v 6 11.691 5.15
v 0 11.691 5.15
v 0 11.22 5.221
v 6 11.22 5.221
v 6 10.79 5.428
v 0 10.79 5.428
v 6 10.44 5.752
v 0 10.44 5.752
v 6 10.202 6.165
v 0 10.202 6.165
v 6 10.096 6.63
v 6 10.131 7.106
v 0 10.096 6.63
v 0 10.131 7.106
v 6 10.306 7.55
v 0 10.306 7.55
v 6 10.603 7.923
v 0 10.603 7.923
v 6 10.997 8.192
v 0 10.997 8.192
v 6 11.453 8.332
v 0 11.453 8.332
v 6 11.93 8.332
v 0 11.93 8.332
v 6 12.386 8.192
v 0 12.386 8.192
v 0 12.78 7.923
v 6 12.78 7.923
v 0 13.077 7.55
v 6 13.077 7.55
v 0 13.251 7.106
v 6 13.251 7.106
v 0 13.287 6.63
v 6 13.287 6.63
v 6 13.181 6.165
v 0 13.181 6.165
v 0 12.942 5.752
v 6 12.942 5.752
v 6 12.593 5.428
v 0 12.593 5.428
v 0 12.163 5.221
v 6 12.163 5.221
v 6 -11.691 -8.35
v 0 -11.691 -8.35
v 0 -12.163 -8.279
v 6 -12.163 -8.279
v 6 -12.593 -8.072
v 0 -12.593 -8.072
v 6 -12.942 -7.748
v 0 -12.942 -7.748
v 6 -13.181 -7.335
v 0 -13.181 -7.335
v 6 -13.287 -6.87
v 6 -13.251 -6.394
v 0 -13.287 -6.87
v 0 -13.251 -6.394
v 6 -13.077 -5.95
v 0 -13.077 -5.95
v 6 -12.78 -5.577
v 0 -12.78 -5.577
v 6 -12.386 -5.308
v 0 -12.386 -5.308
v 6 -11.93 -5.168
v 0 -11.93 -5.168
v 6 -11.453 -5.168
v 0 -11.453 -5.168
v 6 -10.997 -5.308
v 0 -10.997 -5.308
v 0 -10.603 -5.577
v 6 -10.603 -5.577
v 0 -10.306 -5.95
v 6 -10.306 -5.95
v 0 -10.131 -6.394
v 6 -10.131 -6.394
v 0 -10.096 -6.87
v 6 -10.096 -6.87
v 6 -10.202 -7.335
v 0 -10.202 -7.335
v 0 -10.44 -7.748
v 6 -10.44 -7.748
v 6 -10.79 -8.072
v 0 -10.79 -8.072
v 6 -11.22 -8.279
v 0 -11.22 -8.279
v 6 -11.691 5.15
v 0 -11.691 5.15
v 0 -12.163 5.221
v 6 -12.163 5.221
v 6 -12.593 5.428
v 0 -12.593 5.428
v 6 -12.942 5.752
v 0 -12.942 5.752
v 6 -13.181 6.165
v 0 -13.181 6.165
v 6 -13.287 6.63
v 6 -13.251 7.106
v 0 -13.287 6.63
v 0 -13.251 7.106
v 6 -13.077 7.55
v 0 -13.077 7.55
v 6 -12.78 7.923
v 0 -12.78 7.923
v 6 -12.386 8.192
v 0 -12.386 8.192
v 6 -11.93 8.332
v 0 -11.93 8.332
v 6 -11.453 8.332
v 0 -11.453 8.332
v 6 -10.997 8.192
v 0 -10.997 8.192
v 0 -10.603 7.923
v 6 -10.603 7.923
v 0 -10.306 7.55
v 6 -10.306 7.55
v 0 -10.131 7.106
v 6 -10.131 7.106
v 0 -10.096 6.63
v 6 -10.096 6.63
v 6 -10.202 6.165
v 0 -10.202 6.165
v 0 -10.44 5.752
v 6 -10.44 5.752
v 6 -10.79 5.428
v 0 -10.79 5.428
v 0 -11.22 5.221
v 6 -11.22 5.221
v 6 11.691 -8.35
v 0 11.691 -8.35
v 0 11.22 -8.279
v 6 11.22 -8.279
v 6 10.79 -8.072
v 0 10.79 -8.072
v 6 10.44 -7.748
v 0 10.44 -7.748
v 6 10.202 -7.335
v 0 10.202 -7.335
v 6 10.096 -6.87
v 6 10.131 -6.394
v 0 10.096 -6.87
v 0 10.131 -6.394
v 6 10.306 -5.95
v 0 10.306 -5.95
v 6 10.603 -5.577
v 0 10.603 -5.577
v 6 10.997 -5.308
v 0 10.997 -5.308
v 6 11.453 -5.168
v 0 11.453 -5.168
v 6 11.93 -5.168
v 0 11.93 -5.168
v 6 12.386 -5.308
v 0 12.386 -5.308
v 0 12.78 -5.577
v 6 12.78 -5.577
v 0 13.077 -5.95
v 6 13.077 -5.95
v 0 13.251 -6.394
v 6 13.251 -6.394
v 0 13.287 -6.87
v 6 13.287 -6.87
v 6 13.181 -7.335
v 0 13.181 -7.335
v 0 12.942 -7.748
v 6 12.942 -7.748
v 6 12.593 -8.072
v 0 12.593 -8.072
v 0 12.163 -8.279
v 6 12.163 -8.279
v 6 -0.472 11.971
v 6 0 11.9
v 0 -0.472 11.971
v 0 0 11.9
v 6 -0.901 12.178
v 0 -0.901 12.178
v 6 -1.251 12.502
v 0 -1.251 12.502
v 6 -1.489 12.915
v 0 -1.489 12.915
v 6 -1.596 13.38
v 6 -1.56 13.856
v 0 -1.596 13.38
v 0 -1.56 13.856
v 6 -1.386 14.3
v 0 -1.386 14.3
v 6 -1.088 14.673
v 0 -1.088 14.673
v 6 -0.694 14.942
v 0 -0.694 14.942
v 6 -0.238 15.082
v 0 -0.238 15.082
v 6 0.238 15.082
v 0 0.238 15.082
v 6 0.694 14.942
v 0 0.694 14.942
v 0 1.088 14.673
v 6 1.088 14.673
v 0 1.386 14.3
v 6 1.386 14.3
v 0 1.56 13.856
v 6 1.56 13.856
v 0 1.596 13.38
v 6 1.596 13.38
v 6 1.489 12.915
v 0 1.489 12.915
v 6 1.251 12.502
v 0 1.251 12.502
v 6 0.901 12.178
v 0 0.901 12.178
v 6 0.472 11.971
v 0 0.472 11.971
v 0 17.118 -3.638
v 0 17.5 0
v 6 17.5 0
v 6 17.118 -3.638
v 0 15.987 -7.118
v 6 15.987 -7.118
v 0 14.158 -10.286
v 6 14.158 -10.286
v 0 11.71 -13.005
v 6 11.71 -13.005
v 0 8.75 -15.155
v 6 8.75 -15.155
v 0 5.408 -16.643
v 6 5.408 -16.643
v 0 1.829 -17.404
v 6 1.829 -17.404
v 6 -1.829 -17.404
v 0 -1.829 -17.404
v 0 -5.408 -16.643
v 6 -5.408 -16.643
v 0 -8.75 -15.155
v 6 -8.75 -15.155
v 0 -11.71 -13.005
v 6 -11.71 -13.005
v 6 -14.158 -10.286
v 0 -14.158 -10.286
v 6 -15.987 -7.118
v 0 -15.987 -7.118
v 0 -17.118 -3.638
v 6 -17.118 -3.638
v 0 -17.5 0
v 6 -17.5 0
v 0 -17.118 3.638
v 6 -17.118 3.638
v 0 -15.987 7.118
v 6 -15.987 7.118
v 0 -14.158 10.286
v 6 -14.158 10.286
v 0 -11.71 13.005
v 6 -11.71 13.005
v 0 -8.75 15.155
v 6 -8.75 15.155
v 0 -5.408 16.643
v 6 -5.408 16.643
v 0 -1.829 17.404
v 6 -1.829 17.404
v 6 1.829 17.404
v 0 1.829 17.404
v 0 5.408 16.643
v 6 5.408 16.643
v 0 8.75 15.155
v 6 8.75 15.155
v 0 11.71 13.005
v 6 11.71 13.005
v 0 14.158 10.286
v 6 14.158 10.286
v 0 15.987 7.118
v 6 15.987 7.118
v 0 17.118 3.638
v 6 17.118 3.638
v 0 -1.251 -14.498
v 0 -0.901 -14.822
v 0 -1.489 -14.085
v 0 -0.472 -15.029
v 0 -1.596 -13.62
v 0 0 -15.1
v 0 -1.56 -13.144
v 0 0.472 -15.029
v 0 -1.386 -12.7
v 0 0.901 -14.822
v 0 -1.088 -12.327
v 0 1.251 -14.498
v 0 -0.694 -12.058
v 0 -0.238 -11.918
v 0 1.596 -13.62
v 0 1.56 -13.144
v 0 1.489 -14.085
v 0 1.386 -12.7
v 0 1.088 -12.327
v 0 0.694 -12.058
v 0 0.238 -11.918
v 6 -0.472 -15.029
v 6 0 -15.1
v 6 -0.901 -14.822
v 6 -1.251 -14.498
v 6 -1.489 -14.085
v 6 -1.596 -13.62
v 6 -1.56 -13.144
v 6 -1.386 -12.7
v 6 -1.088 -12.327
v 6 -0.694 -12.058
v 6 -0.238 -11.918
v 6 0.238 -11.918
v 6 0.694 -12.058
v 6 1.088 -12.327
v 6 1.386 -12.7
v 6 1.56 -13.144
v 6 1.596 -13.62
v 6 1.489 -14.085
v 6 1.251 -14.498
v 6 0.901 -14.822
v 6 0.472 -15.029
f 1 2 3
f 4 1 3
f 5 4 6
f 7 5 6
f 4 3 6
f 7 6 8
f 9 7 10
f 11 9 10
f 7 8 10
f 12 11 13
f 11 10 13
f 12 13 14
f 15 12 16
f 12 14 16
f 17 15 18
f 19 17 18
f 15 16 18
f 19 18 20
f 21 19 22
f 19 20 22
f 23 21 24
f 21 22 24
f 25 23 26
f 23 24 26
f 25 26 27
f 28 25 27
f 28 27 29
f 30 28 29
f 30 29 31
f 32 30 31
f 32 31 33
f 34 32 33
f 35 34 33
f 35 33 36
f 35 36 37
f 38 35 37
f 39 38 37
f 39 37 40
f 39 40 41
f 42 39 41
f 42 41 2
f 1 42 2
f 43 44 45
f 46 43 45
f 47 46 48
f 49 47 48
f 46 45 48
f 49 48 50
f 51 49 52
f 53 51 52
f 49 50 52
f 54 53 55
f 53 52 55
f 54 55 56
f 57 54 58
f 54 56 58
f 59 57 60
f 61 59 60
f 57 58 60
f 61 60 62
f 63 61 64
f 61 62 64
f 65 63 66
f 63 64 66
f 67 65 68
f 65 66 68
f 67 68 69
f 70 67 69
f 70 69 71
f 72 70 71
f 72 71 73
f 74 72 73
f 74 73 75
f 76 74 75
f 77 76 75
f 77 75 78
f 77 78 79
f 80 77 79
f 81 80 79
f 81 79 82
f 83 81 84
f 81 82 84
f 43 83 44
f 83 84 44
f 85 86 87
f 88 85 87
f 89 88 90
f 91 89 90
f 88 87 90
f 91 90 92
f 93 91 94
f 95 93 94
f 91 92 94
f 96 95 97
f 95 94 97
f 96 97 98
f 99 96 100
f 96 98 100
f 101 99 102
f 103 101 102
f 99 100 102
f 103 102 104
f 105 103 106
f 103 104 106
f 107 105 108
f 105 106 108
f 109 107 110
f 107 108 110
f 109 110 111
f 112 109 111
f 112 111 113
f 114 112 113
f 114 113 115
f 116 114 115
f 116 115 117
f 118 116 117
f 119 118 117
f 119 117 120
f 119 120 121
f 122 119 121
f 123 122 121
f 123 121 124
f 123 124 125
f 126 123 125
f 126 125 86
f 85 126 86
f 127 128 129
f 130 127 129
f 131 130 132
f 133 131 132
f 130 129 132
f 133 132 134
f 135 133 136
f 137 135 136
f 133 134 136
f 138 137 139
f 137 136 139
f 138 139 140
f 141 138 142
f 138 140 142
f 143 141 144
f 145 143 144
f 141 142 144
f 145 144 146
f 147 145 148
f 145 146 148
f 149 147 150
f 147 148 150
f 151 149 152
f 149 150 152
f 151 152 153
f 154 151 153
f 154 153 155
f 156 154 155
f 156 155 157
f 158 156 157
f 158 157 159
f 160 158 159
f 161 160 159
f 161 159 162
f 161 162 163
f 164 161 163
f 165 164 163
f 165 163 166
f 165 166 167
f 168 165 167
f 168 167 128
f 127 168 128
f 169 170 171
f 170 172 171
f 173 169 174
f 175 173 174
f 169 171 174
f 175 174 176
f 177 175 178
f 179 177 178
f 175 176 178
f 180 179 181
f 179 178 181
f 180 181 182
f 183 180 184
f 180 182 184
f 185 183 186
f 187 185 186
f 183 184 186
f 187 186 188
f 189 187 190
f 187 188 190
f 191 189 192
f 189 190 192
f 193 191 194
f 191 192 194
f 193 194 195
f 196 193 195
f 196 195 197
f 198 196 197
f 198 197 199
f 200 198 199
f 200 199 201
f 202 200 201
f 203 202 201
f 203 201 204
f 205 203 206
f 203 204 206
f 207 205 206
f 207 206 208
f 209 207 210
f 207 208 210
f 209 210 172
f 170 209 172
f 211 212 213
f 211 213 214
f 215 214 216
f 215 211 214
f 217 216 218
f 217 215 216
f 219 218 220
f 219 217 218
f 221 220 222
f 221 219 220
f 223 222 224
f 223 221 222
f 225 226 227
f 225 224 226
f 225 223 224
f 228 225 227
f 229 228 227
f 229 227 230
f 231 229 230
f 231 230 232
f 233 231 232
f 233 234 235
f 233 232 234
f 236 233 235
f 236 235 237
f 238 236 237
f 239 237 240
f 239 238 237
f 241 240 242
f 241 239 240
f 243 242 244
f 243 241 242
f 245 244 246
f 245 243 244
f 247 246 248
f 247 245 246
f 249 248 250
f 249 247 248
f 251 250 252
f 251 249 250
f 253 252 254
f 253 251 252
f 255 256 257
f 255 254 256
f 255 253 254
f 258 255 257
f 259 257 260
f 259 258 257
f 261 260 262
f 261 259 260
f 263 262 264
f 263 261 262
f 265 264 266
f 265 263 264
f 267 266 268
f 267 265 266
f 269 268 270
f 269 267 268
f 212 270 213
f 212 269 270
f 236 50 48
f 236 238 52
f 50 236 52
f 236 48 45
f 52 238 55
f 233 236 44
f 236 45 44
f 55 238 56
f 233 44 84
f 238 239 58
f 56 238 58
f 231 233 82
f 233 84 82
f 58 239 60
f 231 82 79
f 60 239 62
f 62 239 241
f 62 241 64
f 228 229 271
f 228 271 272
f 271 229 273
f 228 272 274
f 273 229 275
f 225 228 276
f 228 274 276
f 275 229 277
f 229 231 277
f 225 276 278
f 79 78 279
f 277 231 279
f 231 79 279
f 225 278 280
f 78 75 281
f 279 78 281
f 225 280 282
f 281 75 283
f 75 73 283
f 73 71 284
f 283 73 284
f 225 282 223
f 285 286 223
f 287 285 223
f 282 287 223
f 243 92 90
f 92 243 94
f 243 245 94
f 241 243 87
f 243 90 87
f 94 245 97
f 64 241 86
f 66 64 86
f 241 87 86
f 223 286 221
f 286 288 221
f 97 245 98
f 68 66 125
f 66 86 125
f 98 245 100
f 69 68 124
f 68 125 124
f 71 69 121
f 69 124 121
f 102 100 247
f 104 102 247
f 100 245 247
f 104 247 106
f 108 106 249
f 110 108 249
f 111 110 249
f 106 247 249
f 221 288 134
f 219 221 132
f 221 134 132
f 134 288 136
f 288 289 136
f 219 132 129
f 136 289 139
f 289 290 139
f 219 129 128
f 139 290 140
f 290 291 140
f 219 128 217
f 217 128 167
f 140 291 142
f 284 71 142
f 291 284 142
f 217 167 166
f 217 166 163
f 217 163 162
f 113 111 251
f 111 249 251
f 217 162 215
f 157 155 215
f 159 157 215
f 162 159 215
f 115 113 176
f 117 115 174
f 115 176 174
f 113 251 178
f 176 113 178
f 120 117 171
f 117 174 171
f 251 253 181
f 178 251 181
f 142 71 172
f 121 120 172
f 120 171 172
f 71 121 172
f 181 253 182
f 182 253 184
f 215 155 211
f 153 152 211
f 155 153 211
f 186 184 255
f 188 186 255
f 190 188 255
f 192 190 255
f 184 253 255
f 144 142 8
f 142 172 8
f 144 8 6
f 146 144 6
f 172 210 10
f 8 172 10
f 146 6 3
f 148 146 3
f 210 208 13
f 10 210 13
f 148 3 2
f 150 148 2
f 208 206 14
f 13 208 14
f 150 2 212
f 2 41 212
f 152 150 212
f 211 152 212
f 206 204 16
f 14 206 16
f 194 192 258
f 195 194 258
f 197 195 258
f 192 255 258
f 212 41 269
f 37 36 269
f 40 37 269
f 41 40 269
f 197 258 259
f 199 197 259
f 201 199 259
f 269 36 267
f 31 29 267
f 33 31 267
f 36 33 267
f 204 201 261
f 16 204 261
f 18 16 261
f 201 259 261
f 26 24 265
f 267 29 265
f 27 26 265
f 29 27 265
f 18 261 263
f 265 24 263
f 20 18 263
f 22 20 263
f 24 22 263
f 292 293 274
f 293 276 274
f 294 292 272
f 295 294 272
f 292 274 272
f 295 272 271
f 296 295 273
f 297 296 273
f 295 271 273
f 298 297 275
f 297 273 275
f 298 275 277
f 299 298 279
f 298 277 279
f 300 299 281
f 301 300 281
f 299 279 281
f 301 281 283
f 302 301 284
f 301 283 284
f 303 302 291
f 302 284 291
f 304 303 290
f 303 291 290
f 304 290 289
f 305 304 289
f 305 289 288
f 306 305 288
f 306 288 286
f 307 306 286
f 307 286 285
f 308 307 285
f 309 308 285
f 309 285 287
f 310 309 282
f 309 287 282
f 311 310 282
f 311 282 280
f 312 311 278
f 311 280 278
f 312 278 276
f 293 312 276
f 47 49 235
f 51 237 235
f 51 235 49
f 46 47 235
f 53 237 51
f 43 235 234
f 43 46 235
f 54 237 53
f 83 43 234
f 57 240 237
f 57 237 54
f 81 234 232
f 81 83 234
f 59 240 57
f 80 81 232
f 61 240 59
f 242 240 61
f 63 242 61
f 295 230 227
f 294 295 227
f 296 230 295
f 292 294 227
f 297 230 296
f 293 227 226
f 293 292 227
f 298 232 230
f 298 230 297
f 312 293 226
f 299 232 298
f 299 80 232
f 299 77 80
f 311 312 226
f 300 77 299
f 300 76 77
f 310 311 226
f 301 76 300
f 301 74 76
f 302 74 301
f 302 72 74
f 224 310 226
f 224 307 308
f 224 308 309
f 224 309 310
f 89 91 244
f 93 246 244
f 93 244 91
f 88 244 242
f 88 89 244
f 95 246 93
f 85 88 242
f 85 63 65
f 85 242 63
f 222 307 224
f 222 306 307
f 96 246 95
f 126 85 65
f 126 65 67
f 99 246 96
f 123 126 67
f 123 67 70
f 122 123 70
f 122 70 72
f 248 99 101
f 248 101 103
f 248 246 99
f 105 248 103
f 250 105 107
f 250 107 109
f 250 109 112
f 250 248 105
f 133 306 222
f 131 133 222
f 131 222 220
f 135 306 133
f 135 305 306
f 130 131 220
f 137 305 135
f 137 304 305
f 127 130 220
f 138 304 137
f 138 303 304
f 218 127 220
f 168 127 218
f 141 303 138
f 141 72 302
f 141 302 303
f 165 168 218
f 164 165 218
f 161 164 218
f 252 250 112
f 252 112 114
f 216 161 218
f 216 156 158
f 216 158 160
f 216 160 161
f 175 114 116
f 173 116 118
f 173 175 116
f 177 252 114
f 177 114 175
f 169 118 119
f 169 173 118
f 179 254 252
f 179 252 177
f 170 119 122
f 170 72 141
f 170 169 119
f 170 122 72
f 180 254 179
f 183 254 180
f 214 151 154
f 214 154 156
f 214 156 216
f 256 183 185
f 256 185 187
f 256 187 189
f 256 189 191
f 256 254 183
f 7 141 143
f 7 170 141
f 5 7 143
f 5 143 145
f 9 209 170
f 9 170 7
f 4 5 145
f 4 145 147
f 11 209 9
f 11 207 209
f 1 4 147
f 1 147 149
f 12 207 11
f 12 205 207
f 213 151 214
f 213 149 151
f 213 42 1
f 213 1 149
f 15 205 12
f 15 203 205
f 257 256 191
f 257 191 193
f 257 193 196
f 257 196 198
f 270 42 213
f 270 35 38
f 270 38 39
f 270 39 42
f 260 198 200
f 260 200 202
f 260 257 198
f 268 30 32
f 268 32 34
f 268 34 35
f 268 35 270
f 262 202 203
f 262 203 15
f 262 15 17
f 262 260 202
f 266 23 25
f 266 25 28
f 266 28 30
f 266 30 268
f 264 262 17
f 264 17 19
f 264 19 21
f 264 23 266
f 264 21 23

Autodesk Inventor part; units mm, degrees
ref_plane "YZ Plane" through (0, 0, 0) normal (1, 0, 0) x (0, 1, 0)
ref_plane "XZ Plane" through (0, 0, 0) normal (0, 1, 0) x (-1, 0, 0)
ref_plane "XY Plane" through (0, 0, 0) normal (0, 0, 1) x (1, 0, 0)
sketch "スケッチ1" plane through (0, 0, 0) normal (1, 0, 0) x (0, 1, 0)
  circle A0 centre (0, 0) radius 17.5
  dimension "d0" = 35
extrude "押し出し1" add sketch "スケッチ1" along normal blind 6
sketch "スケッチ2" plane through (6, 0, 0) normal (1, 0, 0) x (0, 0, -1)
  circle A0 centre (0, 0) radius 13.5
  point P0 (13.5, 0)
  point P1 (6.75, 11.6913)
  point P2 (-6.75, 11.6913)
  point P3 (-13.5, 0)
  point P4 (-6.75, -11.6913)
  point P5 (6.75, -11.6913)
  dimension "d3" = 27
  dimension "d6" = 360
hole "穴1" at (6, 0, -13.5) at (6, 11.6913, -6.75) at (6, 11.6913, 6.75) at (6, 0, 13.5) at (6, -11.6913, 6.75) at (6, -11.6913, -6.75) direction (-1, 0, 0) diameter 3.2 end through all
properties part number "link5_plate1" material "ABS プラスチック"
